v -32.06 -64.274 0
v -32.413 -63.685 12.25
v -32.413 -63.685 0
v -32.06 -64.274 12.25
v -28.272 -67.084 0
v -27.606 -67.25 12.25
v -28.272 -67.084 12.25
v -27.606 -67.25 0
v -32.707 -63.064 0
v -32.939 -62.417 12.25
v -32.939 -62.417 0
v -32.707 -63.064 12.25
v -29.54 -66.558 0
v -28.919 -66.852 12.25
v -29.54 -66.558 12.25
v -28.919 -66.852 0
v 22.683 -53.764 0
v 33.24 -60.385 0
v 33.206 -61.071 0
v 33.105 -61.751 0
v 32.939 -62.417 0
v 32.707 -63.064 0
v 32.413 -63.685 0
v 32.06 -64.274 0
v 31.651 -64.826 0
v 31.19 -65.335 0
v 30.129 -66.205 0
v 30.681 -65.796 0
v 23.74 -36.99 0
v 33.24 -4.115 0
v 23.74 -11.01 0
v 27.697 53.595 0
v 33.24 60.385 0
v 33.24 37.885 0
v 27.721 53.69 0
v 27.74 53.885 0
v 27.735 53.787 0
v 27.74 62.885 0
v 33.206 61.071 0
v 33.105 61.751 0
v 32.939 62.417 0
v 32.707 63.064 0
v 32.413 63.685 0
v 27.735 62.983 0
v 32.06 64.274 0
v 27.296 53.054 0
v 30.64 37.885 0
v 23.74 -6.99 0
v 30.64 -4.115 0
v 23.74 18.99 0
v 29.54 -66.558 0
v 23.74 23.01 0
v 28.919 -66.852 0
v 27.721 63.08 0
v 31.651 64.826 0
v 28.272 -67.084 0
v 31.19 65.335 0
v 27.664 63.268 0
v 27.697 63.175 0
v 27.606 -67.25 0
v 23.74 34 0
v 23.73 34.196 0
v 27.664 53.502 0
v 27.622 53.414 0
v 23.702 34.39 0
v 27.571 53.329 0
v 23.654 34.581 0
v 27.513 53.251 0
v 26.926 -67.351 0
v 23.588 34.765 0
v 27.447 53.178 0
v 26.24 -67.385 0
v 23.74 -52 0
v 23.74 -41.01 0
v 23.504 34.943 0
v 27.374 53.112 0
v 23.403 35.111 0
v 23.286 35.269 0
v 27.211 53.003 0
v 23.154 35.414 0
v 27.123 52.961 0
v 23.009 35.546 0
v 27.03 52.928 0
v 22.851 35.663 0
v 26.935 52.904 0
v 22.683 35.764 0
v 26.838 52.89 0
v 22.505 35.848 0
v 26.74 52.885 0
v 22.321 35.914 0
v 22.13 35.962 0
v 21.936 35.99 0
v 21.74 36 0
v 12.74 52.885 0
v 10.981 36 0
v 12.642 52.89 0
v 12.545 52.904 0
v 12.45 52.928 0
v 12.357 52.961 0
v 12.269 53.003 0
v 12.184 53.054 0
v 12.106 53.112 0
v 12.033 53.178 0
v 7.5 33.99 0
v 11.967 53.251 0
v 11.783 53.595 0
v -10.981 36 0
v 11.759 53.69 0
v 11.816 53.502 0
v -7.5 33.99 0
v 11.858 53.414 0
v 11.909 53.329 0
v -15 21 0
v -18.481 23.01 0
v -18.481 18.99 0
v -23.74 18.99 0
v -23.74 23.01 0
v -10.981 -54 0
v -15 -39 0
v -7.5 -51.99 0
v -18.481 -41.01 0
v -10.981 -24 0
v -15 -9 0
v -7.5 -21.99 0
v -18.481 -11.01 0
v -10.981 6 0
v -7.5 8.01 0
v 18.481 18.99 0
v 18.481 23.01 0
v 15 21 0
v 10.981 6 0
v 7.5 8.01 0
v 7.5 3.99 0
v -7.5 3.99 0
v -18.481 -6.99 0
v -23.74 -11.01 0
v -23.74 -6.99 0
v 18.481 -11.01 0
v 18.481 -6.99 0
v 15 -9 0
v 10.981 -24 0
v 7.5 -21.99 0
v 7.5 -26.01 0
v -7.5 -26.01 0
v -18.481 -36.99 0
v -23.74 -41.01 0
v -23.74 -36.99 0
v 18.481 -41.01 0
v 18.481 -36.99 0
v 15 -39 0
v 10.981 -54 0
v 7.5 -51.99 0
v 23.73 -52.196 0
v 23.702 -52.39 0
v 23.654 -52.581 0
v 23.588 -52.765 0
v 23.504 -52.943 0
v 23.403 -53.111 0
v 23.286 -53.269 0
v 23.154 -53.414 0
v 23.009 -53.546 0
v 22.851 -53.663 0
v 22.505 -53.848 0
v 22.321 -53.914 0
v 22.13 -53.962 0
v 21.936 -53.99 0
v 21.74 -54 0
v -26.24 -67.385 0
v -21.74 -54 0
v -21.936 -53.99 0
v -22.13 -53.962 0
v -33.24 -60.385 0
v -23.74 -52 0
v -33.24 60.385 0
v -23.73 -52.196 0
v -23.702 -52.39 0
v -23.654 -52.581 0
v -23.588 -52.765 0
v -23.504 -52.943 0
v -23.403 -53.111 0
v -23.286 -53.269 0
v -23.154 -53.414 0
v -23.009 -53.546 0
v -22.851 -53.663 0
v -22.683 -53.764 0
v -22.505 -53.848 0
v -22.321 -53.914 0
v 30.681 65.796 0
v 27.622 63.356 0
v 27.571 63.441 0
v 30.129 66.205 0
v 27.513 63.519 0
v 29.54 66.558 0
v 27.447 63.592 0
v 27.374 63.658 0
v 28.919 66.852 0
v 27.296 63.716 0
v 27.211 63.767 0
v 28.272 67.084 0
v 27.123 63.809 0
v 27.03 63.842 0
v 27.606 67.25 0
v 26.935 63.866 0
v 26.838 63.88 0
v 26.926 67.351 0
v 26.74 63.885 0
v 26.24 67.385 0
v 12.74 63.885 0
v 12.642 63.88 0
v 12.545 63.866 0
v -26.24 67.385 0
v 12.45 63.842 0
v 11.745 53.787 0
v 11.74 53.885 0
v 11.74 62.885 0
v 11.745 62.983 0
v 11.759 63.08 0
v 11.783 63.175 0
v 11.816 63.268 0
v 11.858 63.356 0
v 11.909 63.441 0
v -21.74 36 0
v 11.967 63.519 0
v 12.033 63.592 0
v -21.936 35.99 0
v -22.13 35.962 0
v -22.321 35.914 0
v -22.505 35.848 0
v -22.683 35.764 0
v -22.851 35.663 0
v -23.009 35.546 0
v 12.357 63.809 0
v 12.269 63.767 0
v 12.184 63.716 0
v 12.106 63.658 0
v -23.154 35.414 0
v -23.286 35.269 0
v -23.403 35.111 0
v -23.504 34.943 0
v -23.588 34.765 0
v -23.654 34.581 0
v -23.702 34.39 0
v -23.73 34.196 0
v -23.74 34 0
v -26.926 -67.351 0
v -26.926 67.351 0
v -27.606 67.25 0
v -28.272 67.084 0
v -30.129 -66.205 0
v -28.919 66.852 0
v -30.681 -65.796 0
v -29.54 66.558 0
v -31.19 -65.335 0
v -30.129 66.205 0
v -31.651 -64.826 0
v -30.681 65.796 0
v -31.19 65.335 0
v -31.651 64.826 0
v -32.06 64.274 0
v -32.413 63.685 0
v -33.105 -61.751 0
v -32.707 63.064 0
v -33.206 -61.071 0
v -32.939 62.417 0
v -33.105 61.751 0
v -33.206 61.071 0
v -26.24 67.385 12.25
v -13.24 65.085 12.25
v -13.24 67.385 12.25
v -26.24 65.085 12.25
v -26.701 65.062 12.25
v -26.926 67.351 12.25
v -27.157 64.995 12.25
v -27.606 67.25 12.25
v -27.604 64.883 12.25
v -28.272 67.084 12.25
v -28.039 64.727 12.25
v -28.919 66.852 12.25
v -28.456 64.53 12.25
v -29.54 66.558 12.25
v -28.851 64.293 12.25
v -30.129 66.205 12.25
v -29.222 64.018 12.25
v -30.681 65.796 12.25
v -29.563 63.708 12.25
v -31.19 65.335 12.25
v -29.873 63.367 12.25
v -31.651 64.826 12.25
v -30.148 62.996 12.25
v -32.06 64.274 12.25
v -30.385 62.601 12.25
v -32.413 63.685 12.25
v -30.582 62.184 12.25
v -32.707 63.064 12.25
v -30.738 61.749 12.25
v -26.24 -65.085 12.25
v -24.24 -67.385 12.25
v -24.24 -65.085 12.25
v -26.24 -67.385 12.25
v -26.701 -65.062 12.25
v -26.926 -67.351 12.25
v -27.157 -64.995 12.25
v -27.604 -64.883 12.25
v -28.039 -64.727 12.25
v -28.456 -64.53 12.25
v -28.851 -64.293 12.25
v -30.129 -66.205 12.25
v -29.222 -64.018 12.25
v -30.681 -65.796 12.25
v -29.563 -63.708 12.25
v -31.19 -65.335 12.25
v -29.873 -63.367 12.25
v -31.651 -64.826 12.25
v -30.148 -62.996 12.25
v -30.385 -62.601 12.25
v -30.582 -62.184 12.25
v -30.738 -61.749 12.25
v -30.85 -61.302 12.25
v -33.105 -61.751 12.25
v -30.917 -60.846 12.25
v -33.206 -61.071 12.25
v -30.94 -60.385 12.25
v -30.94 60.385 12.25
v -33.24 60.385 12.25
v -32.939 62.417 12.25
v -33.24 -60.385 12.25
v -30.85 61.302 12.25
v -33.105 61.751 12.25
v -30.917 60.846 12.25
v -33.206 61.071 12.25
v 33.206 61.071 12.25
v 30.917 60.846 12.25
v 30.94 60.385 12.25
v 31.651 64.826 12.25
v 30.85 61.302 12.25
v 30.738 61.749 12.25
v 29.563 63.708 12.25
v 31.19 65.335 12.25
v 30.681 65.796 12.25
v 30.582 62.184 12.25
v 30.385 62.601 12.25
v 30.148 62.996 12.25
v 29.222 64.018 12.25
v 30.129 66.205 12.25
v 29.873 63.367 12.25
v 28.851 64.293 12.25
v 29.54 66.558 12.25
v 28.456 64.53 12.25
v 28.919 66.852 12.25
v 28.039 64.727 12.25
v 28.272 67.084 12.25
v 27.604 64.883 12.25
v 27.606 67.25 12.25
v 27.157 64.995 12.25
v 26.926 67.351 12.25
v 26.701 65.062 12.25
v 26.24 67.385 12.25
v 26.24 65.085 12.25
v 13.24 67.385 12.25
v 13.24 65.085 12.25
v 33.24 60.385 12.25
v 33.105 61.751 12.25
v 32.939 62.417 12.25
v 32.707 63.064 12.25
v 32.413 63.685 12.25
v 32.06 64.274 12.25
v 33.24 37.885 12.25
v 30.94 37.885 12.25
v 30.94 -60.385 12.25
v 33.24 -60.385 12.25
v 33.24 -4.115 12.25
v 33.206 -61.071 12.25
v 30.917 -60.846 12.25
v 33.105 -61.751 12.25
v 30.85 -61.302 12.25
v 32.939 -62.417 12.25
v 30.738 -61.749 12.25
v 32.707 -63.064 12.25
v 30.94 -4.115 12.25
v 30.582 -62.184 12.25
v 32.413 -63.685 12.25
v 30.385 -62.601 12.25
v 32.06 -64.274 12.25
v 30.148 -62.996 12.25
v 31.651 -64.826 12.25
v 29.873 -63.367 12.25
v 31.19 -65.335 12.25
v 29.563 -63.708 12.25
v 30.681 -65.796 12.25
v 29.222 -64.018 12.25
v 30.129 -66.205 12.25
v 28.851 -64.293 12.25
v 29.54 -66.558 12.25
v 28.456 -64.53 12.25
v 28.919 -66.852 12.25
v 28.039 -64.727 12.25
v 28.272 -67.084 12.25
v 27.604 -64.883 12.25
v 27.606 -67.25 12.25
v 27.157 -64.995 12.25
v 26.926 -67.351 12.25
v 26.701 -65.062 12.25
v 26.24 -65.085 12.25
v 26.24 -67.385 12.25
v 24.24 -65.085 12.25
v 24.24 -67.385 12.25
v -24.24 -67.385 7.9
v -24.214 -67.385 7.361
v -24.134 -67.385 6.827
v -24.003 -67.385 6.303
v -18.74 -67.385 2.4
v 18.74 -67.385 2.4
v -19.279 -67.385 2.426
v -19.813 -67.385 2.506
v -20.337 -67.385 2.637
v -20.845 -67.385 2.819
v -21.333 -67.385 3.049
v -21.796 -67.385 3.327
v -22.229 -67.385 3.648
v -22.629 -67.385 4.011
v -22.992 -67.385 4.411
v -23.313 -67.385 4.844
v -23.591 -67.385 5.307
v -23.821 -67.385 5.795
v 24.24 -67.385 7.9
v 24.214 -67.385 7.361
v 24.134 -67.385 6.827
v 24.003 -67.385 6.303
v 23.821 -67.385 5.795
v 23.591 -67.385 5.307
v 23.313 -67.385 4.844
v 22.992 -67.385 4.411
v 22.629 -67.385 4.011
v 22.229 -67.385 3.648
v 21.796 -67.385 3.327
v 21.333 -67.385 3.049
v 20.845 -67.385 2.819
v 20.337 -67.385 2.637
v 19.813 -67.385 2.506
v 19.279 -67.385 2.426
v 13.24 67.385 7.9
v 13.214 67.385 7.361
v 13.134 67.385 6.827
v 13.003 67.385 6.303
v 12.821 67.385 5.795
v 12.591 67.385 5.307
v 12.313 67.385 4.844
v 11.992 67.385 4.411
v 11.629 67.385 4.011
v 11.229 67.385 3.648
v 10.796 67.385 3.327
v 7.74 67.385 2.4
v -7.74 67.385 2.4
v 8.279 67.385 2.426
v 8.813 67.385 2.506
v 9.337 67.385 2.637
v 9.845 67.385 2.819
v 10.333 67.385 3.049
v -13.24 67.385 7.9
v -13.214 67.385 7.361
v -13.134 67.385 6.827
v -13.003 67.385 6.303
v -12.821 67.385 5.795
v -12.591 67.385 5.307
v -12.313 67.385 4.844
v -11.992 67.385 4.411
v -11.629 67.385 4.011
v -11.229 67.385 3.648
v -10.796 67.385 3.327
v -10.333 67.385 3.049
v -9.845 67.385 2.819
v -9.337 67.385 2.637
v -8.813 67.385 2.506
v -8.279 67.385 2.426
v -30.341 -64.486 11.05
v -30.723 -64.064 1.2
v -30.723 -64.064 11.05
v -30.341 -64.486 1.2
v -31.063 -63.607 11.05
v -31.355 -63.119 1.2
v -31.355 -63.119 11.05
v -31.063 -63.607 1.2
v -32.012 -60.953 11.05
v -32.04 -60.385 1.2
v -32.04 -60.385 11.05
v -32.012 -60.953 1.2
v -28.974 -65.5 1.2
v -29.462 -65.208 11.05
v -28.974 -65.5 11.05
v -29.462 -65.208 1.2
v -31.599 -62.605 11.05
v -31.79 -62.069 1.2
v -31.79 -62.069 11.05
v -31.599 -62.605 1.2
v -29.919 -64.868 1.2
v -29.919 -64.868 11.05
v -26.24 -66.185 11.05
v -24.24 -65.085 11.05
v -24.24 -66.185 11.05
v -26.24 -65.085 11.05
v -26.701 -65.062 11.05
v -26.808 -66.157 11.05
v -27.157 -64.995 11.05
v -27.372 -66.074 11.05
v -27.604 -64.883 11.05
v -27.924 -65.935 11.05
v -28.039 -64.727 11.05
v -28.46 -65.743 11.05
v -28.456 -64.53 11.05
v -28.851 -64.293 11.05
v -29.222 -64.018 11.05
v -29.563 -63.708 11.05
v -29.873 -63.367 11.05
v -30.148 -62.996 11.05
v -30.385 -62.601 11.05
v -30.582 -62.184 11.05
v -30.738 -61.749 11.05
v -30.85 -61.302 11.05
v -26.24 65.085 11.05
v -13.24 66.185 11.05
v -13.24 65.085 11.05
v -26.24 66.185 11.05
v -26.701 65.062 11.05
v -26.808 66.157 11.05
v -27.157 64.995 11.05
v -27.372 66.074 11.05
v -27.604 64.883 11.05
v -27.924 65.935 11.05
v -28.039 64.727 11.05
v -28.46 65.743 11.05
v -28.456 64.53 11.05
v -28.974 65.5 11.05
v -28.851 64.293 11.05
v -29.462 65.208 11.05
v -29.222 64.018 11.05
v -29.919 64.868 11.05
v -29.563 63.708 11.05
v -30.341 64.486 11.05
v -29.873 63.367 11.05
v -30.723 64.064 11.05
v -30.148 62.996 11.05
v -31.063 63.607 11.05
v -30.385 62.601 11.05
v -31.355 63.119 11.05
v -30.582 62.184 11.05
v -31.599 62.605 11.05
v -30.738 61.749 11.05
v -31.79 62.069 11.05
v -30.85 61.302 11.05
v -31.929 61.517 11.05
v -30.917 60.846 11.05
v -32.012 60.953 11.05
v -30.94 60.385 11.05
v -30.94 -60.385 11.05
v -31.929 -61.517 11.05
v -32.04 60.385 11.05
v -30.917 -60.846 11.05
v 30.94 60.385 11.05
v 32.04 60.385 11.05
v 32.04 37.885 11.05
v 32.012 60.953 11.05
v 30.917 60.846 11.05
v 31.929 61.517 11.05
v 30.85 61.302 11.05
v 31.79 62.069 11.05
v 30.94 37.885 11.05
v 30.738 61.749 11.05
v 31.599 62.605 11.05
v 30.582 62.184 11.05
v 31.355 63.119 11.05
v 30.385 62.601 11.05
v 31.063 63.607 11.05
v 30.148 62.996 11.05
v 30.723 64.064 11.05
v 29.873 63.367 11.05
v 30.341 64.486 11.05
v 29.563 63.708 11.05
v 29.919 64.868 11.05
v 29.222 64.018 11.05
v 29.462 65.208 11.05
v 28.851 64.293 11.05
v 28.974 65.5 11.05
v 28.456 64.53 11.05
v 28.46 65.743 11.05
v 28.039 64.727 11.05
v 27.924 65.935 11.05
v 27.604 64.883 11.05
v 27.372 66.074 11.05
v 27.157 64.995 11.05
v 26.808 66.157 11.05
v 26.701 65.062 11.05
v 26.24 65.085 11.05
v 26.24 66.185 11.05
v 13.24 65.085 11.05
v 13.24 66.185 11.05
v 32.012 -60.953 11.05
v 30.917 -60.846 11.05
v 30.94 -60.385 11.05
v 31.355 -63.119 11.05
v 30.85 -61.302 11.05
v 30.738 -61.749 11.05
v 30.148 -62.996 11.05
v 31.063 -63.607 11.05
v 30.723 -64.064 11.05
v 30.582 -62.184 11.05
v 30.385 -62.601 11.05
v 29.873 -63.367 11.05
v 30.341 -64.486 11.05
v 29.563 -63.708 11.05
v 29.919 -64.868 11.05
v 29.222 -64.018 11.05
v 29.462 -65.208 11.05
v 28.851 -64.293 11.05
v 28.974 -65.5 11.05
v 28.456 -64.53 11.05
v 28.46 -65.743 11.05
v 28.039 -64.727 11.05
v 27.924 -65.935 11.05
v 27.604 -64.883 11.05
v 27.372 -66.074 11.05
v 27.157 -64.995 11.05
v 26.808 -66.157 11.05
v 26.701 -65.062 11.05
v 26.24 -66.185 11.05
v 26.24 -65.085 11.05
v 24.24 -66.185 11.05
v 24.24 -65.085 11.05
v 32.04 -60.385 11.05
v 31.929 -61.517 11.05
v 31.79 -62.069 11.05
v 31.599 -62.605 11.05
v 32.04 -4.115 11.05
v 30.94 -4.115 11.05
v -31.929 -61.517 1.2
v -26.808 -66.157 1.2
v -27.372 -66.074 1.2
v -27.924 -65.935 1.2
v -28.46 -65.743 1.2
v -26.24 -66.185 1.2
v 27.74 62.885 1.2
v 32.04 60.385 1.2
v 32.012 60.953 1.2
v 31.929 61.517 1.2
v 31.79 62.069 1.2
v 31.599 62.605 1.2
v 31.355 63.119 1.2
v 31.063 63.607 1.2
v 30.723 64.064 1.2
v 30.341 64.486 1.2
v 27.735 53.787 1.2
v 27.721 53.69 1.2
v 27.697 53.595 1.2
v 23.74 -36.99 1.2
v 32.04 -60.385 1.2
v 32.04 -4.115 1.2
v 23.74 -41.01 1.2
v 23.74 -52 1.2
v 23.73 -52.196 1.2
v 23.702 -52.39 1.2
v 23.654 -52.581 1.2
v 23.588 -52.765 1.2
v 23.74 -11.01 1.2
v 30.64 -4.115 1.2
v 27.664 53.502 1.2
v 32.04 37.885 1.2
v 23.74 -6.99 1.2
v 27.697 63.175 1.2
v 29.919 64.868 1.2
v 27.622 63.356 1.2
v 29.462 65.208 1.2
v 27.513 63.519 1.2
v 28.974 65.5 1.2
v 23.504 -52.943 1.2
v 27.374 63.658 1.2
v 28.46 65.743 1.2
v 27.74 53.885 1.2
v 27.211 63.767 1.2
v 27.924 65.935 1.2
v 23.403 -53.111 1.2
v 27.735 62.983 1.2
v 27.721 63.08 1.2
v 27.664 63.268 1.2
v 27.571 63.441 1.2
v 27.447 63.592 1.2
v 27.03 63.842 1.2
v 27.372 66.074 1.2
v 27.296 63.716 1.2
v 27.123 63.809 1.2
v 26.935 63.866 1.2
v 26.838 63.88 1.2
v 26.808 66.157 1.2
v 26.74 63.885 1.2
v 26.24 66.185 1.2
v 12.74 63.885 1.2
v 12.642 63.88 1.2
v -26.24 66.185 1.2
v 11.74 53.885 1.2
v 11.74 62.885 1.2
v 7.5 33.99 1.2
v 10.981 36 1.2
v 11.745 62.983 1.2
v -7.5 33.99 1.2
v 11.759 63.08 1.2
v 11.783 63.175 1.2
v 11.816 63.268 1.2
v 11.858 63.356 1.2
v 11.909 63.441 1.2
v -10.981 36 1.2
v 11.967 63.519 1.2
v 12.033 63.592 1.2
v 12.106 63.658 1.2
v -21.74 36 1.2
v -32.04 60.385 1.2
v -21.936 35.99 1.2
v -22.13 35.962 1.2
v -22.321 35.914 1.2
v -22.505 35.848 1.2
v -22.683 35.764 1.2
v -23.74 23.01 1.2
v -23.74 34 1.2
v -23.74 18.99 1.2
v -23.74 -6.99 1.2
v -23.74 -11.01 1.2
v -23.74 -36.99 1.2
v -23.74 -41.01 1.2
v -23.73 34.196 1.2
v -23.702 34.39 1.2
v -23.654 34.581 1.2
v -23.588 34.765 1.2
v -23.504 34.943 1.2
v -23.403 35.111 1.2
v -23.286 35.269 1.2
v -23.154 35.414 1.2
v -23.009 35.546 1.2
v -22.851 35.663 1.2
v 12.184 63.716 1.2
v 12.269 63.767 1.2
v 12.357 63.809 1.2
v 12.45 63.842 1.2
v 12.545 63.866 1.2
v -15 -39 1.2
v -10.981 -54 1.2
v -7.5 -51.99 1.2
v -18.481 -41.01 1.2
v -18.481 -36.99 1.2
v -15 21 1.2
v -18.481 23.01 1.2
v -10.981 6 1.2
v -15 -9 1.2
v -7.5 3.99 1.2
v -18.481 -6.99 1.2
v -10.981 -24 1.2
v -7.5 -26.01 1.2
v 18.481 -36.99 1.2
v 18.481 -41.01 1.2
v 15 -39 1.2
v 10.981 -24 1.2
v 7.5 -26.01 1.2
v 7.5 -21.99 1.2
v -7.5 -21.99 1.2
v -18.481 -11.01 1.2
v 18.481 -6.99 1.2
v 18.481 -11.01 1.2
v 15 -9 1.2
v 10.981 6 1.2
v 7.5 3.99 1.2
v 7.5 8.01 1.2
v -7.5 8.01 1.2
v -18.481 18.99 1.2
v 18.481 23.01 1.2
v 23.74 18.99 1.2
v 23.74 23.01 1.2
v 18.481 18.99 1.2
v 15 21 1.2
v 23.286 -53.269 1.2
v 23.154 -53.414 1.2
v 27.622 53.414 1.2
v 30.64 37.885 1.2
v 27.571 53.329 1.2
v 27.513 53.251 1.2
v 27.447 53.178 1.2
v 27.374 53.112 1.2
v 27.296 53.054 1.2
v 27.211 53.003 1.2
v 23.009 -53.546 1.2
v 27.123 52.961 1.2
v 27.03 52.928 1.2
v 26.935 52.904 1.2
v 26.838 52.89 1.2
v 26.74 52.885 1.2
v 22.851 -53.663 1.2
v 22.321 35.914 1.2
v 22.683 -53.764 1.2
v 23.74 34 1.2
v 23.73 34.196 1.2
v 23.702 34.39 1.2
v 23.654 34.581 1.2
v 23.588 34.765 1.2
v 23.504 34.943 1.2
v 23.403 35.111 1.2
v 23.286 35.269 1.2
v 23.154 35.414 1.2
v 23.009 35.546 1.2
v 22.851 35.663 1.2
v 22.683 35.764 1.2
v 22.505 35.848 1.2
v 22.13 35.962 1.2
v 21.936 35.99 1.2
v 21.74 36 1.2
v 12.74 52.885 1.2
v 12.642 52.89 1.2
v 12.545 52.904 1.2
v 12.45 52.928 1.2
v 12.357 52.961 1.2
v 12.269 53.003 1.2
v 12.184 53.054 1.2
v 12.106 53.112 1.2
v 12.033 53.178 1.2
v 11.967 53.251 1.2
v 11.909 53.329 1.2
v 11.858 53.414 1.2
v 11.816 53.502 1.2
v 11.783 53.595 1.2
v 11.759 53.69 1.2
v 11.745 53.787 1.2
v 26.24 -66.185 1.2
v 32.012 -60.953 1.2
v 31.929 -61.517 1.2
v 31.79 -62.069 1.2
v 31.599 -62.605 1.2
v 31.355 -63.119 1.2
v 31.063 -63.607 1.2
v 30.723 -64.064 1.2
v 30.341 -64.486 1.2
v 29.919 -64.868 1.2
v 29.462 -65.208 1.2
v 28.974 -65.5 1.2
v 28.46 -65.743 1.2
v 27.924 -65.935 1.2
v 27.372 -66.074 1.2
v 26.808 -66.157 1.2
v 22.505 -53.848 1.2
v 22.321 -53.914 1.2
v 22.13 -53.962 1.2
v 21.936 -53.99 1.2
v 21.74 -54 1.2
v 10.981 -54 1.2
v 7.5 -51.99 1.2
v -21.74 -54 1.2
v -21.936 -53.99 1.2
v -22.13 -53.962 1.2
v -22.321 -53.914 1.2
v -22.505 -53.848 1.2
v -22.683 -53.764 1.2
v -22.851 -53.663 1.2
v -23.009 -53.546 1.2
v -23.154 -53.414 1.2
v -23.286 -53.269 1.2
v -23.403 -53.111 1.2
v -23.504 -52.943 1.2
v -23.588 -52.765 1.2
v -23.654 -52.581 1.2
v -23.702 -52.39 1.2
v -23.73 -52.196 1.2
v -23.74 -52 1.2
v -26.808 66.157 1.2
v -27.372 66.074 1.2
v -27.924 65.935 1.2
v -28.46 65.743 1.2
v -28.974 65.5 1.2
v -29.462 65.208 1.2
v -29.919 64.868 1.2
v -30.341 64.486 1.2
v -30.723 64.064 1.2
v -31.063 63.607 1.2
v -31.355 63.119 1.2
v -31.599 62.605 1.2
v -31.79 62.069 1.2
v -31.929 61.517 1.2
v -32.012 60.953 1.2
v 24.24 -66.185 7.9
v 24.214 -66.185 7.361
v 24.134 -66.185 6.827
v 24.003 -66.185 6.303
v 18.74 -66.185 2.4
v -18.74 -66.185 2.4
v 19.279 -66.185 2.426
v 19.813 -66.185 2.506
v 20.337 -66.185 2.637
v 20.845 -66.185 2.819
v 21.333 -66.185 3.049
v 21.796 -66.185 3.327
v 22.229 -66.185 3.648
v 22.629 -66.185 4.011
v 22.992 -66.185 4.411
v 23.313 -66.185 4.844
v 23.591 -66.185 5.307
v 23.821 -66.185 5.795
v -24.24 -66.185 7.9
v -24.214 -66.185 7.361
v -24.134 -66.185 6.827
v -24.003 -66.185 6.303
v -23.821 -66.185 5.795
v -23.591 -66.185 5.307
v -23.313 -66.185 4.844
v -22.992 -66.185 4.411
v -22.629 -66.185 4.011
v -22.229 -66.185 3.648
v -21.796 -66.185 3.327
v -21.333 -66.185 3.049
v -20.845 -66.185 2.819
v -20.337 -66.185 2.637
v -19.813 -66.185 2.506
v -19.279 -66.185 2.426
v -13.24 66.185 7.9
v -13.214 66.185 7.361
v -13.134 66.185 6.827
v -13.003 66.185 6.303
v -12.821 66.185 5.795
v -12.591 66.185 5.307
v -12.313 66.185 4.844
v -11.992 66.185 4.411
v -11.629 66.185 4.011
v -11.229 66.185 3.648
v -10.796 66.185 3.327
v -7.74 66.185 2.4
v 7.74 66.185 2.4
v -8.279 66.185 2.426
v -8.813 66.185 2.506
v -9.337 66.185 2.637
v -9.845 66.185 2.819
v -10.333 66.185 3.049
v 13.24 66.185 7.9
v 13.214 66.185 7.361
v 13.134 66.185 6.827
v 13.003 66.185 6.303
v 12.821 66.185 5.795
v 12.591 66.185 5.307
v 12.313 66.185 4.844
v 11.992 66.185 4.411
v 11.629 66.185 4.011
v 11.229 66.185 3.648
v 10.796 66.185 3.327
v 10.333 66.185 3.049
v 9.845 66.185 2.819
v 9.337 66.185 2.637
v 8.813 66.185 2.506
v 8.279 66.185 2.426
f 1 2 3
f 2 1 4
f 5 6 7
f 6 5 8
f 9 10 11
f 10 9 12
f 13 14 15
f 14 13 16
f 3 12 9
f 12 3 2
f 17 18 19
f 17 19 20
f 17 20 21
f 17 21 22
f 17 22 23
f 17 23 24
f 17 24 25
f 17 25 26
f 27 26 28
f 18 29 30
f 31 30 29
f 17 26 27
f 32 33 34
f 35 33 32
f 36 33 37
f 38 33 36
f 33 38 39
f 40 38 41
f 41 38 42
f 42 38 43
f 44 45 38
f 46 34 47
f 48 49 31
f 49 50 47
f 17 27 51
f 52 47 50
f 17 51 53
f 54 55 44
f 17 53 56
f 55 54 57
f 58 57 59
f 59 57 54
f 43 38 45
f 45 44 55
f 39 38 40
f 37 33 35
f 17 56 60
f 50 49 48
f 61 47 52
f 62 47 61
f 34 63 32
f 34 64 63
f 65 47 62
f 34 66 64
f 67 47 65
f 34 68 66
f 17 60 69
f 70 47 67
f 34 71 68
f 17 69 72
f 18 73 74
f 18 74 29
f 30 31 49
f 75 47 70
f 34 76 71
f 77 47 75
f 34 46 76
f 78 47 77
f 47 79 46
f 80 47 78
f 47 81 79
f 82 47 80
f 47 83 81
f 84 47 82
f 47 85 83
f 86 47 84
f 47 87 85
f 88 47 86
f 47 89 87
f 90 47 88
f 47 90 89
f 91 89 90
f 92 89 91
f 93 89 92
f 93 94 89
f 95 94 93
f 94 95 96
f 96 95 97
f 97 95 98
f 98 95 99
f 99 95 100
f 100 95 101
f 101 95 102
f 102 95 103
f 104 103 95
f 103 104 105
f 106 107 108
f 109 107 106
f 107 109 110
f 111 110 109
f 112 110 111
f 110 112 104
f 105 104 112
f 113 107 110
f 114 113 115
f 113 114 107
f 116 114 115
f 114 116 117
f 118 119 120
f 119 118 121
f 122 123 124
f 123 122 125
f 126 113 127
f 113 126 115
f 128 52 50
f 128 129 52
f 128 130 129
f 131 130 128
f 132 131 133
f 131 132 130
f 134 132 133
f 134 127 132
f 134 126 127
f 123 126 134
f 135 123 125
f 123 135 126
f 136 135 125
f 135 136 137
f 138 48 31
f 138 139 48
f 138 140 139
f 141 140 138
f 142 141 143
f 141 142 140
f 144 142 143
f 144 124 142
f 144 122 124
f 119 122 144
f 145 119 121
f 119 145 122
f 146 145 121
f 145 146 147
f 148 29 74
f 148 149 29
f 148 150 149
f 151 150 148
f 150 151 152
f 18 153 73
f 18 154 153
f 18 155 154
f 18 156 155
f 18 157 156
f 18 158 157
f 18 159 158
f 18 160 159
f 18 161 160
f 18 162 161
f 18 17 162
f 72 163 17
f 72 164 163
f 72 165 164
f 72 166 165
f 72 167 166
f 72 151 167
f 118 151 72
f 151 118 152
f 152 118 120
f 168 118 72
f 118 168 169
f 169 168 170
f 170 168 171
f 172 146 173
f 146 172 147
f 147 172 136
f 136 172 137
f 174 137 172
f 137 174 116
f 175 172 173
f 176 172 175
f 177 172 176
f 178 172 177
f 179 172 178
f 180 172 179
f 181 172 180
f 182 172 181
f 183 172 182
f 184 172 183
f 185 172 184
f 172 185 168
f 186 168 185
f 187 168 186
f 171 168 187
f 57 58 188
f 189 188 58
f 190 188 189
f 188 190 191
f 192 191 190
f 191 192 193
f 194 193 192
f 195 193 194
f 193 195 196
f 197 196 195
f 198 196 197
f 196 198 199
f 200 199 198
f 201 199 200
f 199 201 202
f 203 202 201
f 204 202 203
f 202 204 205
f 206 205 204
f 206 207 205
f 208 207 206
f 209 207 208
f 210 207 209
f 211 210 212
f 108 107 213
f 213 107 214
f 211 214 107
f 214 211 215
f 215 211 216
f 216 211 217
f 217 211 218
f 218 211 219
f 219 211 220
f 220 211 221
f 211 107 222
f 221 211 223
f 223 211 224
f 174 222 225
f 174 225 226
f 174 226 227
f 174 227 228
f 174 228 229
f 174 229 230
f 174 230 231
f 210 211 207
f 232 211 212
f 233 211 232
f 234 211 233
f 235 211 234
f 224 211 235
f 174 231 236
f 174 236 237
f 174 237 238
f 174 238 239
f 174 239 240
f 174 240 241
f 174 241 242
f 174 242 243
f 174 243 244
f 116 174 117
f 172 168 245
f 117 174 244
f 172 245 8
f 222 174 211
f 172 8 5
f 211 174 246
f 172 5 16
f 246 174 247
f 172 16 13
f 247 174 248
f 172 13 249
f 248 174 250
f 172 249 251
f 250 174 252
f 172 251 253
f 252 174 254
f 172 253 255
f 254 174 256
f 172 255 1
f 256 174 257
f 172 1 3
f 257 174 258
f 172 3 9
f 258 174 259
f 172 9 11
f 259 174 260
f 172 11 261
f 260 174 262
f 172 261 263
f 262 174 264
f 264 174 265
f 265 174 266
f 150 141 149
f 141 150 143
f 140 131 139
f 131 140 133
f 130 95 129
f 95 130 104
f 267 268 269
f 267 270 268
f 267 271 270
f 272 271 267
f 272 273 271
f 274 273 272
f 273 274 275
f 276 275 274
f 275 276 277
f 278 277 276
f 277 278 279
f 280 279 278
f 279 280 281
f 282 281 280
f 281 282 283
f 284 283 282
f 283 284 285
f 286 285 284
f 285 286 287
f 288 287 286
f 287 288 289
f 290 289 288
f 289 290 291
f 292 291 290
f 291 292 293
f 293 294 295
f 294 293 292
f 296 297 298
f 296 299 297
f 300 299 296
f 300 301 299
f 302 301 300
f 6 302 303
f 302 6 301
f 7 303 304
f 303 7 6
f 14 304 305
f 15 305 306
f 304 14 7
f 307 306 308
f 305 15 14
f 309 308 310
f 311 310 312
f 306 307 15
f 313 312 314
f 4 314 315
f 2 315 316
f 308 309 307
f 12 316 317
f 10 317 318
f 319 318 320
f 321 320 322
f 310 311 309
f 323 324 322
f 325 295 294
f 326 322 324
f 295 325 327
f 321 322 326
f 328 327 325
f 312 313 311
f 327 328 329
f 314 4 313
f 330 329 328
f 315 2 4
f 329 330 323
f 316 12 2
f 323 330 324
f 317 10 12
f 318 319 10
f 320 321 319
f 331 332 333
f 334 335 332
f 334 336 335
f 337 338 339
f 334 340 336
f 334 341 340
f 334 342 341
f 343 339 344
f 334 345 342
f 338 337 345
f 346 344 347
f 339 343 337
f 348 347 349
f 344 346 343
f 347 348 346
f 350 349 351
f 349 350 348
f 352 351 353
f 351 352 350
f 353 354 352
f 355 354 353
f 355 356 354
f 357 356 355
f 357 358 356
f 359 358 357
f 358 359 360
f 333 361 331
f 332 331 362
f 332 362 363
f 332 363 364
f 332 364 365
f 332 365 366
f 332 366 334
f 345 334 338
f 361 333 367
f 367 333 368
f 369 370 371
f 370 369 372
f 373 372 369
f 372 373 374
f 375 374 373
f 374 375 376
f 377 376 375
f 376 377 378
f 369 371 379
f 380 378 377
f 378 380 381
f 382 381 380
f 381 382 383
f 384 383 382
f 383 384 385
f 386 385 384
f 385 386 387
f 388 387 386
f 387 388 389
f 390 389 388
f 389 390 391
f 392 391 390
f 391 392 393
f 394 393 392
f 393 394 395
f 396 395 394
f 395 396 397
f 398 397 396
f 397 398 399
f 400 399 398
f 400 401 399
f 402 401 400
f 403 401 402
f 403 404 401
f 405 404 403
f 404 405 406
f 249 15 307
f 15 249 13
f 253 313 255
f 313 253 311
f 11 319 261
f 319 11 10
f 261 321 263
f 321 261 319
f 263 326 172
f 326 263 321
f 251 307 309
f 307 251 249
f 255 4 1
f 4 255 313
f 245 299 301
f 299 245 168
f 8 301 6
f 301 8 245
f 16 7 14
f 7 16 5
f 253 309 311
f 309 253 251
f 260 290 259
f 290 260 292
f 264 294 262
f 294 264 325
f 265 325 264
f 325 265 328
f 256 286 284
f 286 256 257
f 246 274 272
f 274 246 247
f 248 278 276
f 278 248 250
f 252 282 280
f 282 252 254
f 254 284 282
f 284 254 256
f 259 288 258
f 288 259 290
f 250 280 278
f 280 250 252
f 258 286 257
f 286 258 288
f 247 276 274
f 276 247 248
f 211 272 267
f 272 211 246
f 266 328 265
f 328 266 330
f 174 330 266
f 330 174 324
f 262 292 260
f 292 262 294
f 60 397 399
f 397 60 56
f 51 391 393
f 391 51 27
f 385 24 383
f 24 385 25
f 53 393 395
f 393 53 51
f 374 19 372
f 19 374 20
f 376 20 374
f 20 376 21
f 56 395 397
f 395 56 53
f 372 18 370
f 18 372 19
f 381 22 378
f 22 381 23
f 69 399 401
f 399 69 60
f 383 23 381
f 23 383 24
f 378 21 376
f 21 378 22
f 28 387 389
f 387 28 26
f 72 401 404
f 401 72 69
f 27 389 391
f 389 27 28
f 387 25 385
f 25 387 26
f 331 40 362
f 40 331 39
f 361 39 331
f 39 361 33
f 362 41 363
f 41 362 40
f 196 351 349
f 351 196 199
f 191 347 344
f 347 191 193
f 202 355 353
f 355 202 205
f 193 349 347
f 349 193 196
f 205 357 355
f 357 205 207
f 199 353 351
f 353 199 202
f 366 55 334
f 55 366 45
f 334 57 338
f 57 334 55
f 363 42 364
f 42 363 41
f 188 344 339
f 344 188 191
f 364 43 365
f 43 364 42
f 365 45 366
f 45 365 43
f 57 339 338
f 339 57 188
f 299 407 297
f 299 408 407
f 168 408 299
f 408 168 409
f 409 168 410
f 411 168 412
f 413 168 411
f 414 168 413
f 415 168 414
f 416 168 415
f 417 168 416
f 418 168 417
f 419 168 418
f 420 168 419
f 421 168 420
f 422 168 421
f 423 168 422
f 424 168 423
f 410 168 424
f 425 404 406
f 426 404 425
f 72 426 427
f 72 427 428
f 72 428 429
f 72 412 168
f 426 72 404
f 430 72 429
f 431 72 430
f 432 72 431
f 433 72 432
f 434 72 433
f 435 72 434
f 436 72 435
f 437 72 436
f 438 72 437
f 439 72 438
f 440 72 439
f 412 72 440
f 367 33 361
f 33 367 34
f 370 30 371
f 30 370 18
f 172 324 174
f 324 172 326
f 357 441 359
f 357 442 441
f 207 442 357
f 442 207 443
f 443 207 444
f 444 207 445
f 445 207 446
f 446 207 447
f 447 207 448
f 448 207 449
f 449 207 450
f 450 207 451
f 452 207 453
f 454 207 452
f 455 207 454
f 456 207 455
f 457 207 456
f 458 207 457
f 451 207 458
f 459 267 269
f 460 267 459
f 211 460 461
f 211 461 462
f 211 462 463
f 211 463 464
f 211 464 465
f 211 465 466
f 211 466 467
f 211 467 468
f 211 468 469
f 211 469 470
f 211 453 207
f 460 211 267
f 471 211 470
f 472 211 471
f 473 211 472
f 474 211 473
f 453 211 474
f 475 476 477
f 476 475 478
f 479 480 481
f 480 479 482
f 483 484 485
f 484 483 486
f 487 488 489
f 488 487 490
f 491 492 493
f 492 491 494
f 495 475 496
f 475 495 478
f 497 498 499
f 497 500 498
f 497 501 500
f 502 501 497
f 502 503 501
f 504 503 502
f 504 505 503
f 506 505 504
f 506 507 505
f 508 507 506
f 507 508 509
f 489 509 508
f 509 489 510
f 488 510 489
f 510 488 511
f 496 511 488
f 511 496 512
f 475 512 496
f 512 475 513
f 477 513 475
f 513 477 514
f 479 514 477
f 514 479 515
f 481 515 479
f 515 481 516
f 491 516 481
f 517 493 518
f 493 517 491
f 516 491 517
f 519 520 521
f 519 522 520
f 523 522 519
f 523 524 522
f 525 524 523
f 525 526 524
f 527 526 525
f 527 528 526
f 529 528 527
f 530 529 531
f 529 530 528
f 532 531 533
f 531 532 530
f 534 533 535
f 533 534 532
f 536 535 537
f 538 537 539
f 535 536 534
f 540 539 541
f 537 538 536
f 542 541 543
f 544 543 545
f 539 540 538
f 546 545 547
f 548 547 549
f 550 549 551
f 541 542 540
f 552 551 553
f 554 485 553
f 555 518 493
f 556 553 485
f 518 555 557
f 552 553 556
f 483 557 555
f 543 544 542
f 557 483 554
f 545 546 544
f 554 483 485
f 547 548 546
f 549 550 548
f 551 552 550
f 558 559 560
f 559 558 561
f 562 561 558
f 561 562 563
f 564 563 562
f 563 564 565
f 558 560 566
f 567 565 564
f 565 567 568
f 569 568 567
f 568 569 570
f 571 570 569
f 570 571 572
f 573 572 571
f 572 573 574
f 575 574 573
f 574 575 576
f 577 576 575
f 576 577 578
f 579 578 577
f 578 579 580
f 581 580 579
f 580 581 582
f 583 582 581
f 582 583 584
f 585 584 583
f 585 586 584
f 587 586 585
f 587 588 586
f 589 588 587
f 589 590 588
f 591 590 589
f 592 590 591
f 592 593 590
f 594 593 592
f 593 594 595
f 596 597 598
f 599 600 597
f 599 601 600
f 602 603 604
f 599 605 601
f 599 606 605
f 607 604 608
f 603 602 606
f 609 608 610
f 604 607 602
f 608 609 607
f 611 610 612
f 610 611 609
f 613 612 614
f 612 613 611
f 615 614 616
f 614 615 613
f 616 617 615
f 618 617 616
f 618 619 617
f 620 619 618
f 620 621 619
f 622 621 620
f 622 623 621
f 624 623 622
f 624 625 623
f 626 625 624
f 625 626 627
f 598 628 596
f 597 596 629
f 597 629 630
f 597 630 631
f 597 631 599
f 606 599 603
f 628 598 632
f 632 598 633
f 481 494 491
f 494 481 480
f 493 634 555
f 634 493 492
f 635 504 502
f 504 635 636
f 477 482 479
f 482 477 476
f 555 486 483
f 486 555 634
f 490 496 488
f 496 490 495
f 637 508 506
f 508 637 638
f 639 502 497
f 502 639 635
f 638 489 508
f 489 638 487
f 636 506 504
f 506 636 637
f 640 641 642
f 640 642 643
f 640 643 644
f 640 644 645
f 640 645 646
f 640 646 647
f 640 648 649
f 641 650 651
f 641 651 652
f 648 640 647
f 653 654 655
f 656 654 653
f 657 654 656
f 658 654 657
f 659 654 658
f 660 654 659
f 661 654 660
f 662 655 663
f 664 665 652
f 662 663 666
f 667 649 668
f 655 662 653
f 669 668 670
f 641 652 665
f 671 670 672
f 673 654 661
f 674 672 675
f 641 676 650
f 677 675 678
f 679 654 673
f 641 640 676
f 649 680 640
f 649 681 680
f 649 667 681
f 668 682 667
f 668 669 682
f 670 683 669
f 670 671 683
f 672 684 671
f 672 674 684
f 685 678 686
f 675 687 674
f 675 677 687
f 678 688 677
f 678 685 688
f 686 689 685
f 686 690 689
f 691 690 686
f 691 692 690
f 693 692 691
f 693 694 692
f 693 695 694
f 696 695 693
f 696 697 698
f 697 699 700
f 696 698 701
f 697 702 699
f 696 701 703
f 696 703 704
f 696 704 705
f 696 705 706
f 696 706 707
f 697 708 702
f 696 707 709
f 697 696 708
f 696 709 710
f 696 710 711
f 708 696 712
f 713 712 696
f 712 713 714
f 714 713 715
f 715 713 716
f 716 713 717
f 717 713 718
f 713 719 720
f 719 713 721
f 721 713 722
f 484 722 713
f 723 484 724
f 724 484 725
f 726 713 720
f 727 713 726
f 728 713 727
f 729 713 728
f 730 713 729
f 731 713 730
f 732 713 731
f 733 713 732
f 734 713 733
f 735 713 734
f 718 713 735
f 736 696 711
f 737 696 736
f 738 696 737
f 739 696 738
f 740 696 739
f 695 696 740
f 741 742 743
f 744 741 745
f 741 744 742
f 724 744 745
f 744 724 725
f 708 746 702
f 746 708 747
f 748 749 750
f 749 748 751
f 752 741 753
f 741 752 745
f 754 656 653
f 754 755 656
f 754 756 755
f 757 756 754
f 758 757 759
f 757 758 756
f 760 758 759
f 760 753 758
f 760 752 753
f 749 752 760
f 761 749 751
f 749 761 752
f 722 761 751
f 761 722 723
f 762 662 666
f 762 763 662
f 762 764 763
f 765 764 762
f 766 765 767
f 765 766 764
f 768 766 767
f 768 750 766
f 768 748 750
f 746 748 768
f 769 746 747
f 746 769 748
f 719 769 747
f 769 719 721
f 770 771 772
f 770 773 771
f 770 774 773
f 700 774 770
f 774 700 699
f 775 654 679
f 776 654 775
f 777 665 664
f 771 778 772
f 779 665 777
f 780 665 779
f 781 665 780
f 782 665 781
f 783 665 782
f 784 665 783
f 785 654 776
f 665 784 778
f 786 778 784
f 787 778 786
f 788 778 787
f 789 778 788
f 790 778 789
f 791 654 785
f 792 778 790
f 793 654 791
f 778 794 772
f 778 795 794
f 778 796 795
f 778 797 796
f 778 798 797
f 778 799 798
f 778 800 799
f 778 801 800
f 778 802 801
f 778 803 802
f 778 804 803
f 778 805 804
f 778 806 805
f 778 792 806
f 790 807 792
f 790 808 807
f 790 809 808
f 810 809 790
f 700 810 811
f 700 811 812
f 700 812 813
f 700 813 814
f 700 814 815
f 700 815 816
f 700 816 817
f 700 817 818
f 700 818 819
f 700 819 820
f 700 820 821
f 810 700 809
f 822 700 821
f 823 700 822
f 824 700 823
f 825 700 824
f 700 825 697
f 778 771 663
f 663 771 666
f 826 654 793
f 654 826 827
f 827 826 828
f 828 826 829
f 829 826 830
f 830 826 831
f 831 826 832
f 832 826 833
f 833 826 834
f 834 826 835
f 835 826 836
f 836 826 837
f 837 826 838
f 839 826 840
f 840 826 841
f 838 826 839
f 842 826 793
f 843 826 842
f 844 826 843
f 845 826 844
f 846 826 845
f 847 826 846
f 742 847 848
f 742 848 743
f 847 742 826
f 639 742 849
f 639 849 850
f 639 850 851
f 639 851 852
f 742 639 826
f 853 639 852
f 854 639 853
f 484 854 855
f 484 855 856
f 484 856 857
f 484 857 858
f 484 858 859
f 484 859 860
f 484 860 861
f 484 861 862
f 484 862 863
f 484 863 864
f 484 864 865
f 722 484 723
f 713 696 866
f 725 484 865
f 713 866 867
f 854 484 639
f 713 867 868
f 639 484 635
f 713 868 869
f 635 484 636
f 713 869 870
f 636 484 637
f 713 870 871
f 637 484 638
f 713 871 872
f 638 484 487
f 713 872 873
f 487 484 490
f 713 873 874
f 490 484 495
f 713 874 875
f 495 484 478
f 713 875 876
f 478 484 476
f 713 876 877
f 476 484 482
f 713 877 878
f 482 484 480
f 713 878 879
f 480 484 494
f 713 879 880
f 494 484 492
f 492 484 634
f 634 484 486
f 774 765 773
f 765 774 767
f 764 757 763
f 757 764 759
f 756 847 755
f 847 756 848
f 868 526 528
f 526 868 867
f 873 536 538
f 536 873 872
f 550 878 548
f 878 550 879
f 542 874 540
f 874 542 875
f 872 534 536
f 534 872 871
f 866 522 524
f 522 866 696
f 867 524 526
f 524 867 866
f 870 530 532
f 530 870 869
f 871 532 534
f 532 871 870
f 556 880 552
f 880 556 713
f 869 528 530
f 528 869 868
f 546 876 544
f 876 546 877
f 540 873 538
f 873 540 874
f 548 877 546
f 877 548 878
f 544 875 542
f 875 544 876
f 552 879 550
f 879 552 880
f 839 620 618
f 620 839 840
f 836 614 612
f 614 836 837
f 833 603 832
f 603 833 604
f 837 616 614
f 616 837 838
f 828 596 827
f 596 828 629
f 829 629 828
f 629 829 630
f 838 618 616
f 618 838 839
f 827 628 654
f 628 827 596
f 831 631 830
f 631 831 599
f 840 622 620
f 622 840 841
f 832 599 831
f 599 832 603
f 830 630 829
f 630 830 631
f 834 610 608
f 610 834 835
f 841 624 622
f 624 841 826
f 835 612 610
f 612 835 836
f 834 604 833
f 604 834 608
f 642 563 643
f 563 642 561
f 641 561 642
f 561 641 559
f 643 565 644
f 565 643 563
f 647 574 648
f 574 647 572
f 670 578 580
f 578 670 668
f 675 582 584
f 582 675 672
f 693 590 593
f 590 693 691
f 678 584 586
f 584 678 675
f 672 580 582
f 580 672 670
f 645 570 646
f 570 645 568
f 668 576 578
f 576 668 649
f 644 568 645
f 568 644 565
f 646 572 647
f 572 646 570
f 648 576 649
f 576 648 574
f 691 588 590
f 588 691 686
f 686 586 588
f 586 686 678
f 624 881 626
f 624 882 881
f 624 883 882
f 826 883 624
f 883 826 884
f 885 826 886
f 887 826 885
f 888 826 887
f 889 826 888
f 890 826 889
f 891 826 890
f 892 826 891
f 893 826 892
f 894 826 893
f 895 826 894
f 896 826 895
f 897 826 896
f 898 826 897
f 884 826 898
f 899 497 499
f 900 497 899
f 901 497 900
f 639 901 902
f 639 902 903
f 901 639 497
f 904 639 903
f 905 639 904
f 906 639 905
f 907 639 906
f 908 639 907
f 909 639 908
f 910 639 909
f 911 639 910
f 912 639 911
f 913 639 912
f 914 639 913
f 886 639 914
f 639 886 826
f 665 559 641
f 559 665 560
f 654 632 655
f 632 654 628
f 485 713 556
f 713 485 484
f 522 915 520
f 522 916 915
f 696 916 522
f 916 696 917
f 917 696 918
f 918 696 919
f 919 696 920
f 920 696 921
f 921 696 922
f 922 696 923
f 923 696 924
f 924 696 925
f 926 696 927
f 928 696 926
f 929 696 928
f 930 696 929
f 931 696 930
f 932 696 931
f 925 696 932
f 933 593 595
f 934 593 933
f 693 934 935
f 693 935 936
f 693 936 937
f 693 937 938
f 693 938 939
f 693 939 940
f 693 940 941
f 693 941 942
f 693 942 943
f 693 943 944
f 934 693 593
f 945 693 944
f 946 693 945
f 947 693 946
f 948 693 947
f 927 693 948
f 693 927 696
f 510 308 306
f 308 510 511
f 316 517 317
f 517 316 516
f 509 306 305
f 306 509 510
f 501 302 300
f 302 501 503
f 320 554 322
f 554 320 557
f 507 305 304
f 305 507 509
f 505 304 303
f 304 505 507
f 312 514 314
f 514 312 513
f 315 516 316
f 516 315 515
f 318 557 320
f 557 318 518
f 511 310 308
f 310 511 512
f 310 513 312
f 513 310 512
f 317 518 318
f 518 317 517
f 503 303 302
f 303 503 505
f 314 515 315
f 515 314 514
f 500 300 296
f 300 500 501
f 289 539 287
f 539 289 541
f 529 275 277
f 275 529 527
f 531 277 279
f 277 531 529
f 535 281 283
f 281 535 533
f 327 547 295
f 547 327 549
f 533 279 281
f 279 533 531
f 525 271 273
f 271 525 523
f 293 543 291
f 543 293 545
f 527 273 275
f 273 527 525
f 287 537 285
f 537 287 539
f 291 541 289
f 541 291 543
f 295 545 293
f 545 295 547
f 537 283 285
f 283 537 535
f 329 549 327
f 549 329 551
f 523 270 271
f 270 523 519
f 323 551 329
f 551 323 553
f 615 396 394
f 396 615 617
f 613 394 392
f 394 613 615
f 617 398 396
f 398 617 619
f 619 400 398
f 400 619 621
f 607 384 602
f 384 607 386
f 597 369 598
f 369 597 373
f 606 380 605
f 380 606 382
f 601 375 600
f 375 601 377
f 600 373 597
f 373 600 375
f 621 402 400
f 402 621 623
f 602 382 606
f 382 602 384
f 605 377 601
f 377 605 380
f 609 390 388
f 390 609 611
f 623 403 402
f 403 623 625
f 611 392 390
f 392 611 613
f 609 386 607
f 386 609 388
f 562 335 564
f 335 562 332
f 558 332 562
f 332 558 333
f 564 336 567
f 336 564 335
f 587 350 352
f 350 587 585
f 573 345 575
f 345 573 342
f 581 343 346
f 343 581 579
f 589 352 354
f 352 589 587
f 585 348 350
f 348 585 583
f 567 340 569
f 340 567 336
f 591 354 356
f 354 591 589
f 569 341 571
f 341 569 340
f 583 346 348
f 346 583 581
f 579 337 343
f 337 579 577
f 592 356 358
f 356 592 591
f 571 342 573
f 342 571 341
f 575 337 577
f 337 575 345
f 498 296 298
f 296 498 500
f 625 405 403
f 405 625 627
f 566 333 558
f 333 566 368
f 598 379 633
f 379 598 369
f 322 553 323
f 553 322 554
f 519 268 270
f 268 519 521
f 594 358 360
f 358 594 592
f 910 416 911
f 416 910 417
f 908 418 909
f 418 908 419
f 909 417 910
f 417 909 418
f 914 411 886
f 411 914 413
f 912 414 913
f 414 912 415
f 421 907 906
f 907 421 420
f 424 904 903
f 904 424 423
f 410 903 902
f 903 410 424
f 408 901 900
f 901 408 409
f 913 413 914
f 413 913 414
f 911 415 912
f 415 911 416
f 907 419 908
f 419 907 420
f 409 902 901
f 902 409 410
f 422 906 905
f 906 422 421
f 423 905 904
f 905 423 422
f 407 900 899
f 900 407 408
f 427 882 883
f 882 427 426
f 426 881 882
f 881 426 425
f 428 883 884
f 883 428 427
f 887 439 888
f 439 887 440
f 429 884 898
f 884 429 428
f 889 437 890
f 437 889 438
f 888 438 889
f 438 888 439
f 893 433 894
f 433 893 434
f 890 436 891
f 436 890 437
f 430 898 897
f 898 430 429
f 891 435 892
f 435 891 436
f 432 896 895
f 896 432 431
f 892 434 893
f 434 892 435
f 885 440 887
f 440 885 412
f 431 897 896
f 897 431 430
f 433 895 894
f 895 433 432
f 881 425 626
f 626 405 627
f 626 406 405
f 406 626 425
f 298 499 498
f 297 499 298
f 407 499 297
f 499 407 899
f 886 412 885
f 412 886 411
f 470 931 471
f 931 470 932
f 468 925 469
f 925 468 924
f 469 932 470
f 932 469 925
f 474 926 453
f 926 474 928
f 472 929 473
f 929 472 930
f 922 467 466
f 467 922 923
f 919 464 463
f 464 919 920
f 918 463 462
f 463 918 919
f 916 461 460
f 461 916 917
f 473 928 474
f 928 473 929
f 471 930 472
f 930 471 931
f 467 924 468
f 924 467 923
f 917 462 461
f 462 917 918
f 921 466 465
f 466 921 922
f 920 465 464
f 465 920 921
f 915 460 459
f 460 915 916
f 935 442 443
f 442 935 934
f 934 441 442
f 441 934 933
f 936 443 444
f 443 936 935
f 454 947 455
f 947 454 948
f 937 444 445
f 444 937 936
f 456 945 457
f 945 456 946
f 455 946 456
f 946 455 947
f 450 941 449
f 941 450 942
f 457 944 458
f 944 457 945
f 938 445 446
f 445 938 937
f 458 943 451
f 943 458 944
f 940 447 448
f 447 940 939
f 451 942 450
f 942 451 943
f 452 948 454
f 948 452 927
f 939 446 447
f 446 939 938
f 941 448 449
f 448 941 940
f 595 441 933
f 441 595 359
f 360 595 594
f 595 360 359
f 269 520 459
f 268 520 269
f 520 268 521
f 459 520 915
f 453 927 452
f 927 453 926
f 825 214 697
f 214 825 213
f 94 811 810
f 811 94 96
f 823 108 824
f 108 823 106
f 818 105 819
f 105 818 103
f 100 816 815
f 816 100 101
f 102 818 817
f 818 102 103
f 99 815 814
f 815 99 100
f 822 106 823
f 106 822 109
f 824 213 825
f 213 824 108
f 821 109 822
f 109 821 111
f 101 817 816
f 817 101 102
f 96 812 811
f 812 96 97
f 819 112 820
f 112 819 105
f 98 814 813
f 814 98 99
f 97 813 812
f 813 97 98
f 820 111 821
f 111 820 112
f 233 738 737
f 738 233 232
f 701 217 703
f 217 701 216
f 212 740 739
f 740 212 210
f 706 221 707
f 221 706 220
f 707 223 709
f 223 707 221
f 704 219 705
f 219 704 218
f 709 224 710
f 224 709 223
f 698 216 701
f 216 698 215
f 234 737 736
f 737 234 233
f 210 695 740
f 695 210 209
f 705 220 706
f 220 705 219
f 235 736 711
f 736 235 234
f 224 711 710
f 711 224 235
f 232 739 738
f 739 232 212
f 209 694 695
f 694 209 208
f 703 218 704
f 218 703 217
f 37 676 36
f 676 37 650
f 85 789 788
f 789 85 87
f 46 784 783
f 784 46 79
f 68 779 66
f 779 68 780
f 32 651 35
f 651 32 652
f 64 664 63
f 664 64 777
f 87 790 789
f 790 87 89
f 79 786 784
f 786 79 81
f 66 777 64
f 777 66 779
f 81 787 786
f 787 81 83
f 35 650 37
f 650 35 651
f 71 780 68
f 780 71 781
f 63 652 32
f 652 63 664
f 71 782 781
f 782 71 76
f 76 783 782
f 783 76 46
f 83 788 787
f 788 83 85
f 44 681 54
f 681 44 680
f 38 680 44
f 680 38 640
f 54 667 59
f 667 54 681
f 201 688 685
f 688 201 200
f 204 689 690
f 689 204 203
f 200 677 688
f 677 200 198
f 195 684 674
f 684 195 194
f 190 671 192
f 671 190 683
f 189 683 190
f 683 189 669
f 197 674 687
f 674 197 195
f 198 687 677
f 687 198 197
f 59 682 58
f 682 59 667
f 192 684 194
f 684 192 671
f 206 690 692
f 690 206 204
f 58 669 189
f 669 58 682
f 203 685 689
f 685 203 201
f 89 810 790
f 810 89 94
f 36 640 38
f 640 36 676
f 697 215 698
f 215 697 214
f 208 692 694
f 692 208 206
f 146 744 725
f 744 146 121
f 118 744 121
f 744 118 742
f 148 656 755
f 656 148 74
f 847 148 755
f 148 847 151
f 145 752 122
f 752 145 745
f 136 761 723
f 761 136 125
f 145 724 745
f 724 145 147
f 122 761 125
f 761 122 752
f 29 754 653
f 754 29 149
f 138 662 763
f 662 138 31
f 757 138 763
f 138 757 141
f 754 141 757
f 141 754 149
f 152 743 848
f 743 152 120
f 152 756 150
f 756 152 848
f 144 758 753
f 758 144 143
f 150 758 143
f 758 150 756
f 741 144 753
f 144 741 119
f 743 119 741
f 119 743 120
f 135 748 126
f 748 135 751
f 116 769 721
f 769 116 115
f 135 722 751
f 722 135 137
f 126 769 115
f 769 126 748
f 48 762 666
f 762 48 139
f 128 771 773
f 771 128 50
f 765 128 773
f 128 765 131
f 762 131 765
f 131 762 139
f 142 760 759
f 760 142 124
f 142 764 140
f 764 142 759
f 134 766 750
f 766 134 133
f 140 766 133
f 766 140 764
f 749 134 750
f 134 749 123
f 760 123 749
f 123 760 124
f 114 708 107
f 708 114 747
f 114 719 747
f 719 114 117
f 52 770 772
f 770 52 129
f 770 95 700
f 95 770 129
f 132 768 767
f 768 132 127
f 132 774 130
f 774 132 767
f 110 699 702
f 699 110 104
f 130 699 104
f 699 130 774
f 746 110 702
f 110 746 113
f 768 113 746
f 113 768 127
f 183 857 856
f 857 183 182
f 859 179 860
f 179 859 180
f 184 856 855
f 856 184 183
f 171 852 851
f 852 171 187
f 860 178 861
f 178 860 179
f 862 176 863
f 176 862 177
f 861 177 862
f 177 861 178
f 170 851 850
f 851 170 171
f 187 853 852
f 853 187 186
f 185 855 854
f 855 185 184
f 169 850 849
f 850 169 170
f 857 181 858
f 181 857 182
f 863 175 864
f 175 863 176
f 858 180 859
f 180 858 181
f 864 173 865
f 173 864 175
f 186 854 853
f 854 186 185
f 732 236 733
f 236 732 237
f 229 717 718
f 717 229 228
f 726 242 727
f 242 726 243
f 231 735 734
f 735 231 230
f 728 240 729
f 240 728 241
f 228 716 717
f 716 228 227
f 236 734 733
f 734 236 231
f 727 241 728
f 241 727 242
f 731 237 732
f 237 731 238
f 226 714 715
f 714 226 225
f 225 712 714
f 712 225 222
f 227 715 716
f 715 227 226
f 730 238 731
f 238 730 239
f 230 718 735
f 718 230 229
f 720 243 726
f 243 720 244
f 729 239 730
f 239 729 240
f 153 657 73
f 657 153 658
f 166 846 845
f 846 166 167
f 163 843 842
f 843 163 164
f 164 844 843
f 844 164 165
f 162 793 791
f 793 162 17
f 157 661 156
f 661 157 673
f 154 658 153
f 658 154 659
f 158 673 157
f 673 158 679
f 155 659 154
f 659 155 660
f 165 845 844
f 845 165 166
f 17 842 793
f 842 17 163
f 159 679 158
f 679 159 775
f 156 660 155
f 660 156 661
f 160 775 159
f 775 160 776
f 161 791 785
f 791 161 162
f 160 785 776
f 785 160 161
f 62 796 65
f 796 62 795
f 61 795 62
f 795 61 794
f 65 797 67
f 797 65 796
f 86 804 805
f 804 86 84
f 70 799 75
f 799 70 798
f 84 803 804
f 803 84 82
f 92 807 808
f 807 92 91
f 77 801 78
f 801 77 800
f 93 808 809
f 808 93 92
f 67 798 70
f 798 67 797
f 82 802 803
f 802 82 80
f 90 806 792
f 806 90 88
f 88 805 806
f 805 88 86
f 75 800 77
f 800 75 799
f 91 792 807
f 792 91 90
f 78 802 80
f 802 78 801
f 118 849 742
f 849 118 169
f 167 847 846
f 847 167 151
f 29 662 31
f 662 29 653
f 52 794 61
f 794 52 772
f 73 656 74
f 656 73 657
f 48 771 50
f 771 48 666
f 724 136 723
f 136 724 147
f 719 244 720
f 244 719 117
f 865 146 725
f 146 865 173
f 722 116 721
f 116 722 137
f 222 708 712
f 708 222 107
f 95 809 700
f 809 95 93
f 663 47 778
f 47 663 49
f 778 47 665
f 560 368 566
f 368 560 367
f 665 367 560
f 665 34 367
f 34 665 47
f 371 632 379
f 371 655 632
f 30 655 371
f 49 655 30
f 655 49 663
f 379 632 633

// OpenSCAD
/*
 * bq Aquaris A4.5 case
 */

// bq provided dimensions:
w = 63.48;
h = 131.77;
d = 9.25;

// Measured/estimated dimensions:
r = 5.5;

module aquarishape(width,height,depth,rounding){
	// Intermediate variables:
	shortwidth = width - 2*rounding;
	shortheight = height - 2*rounding;

	union() {
		// Bottom parallelepiped:
		translate([-shortwidth/2,-height/2,0]){
			cube([shortwidth,rounding,depth]);
		}

		// Middle parallelepiped:
		translate([-width/2,-shortheight/2,0]){
			cube([width,shortheight,depth]);
		}

		// Top parellelepiped:
		translate([-shortwidth/2,shortheight/2,0]){
			cube([shortwidth,rounding,depth]);
		}

		// Rounded corners:
		for(i=[-1,1]){
			for(j=[-1,1]){
				translate([i*shortwidth/2,j*shortheight/2,0]){
					cylinder(h=depth,r=rounding,$fn=64);
				}
			}
		}
	}
}

// Case:
tolerance = 0.6;
thickness = 2.4;
clip = 1.6;

difference() {
	union() {
		// Main case
		aquarishape(w + tolerance + thickness,
			h + tolerance + thickness,
			d + tolerance + thickness,
			r + (tolerance + thickness)/2);
	}
	// Case cavities
	translate([0,0,thickness/2]){
		aquarishape(w + tolerance,
			h + tolerance,
			d + tolerance,
			r + tolerance/2);
		aquarishape(w - clip,
			h - clip,
			d + tolerance + thickness,
			r - clip/ 2);
	}
	// Charging port and speakers
	translate ([0,-h/2-tolerance - thickness,d+thickness]) rotate(-90,[1,0,0]){
		aquarishape(w - 2*r - 4,2*d,0.6*h,r);
	}
	// Audio jack
	translate ([0,h/2-tolerance - thickness,d+thickness]) rotate(-90,[1,0,0]){
		aquarishape(w - 2*r - 26,2*d,0.6*h,r);
	}
	// Camera hole
	translate ([w/2-4-8,h/2-2-5.5,0]) aquarishape(16,11,thickness,1);
	// Volume & Locking Buttons
	translate ([w/2-tolerance/2-clip/2,h/2-70,0]) cube([2*thickness,42,1.5*d]);
	// Decorative & Material-saving Holes
	translate ([0,-9,0]){
		intersection() {
			union() {
				for(i=[-2:1:3]){
					translate ([0,i*30,0]){
						cylinder(h=thickness,r=15,$fn=6);
						for(ra=[60,300]){
							rotate(ra,[0,0,1]) translate ([0,30,0]) cylinder(h=thickness,r=15,$fn=6);
						}
					}
				}
			}
			// Bounding space
			translate ([0,0,-1]) aquarishape(w-16,90,10,2);
		}
	}
}
